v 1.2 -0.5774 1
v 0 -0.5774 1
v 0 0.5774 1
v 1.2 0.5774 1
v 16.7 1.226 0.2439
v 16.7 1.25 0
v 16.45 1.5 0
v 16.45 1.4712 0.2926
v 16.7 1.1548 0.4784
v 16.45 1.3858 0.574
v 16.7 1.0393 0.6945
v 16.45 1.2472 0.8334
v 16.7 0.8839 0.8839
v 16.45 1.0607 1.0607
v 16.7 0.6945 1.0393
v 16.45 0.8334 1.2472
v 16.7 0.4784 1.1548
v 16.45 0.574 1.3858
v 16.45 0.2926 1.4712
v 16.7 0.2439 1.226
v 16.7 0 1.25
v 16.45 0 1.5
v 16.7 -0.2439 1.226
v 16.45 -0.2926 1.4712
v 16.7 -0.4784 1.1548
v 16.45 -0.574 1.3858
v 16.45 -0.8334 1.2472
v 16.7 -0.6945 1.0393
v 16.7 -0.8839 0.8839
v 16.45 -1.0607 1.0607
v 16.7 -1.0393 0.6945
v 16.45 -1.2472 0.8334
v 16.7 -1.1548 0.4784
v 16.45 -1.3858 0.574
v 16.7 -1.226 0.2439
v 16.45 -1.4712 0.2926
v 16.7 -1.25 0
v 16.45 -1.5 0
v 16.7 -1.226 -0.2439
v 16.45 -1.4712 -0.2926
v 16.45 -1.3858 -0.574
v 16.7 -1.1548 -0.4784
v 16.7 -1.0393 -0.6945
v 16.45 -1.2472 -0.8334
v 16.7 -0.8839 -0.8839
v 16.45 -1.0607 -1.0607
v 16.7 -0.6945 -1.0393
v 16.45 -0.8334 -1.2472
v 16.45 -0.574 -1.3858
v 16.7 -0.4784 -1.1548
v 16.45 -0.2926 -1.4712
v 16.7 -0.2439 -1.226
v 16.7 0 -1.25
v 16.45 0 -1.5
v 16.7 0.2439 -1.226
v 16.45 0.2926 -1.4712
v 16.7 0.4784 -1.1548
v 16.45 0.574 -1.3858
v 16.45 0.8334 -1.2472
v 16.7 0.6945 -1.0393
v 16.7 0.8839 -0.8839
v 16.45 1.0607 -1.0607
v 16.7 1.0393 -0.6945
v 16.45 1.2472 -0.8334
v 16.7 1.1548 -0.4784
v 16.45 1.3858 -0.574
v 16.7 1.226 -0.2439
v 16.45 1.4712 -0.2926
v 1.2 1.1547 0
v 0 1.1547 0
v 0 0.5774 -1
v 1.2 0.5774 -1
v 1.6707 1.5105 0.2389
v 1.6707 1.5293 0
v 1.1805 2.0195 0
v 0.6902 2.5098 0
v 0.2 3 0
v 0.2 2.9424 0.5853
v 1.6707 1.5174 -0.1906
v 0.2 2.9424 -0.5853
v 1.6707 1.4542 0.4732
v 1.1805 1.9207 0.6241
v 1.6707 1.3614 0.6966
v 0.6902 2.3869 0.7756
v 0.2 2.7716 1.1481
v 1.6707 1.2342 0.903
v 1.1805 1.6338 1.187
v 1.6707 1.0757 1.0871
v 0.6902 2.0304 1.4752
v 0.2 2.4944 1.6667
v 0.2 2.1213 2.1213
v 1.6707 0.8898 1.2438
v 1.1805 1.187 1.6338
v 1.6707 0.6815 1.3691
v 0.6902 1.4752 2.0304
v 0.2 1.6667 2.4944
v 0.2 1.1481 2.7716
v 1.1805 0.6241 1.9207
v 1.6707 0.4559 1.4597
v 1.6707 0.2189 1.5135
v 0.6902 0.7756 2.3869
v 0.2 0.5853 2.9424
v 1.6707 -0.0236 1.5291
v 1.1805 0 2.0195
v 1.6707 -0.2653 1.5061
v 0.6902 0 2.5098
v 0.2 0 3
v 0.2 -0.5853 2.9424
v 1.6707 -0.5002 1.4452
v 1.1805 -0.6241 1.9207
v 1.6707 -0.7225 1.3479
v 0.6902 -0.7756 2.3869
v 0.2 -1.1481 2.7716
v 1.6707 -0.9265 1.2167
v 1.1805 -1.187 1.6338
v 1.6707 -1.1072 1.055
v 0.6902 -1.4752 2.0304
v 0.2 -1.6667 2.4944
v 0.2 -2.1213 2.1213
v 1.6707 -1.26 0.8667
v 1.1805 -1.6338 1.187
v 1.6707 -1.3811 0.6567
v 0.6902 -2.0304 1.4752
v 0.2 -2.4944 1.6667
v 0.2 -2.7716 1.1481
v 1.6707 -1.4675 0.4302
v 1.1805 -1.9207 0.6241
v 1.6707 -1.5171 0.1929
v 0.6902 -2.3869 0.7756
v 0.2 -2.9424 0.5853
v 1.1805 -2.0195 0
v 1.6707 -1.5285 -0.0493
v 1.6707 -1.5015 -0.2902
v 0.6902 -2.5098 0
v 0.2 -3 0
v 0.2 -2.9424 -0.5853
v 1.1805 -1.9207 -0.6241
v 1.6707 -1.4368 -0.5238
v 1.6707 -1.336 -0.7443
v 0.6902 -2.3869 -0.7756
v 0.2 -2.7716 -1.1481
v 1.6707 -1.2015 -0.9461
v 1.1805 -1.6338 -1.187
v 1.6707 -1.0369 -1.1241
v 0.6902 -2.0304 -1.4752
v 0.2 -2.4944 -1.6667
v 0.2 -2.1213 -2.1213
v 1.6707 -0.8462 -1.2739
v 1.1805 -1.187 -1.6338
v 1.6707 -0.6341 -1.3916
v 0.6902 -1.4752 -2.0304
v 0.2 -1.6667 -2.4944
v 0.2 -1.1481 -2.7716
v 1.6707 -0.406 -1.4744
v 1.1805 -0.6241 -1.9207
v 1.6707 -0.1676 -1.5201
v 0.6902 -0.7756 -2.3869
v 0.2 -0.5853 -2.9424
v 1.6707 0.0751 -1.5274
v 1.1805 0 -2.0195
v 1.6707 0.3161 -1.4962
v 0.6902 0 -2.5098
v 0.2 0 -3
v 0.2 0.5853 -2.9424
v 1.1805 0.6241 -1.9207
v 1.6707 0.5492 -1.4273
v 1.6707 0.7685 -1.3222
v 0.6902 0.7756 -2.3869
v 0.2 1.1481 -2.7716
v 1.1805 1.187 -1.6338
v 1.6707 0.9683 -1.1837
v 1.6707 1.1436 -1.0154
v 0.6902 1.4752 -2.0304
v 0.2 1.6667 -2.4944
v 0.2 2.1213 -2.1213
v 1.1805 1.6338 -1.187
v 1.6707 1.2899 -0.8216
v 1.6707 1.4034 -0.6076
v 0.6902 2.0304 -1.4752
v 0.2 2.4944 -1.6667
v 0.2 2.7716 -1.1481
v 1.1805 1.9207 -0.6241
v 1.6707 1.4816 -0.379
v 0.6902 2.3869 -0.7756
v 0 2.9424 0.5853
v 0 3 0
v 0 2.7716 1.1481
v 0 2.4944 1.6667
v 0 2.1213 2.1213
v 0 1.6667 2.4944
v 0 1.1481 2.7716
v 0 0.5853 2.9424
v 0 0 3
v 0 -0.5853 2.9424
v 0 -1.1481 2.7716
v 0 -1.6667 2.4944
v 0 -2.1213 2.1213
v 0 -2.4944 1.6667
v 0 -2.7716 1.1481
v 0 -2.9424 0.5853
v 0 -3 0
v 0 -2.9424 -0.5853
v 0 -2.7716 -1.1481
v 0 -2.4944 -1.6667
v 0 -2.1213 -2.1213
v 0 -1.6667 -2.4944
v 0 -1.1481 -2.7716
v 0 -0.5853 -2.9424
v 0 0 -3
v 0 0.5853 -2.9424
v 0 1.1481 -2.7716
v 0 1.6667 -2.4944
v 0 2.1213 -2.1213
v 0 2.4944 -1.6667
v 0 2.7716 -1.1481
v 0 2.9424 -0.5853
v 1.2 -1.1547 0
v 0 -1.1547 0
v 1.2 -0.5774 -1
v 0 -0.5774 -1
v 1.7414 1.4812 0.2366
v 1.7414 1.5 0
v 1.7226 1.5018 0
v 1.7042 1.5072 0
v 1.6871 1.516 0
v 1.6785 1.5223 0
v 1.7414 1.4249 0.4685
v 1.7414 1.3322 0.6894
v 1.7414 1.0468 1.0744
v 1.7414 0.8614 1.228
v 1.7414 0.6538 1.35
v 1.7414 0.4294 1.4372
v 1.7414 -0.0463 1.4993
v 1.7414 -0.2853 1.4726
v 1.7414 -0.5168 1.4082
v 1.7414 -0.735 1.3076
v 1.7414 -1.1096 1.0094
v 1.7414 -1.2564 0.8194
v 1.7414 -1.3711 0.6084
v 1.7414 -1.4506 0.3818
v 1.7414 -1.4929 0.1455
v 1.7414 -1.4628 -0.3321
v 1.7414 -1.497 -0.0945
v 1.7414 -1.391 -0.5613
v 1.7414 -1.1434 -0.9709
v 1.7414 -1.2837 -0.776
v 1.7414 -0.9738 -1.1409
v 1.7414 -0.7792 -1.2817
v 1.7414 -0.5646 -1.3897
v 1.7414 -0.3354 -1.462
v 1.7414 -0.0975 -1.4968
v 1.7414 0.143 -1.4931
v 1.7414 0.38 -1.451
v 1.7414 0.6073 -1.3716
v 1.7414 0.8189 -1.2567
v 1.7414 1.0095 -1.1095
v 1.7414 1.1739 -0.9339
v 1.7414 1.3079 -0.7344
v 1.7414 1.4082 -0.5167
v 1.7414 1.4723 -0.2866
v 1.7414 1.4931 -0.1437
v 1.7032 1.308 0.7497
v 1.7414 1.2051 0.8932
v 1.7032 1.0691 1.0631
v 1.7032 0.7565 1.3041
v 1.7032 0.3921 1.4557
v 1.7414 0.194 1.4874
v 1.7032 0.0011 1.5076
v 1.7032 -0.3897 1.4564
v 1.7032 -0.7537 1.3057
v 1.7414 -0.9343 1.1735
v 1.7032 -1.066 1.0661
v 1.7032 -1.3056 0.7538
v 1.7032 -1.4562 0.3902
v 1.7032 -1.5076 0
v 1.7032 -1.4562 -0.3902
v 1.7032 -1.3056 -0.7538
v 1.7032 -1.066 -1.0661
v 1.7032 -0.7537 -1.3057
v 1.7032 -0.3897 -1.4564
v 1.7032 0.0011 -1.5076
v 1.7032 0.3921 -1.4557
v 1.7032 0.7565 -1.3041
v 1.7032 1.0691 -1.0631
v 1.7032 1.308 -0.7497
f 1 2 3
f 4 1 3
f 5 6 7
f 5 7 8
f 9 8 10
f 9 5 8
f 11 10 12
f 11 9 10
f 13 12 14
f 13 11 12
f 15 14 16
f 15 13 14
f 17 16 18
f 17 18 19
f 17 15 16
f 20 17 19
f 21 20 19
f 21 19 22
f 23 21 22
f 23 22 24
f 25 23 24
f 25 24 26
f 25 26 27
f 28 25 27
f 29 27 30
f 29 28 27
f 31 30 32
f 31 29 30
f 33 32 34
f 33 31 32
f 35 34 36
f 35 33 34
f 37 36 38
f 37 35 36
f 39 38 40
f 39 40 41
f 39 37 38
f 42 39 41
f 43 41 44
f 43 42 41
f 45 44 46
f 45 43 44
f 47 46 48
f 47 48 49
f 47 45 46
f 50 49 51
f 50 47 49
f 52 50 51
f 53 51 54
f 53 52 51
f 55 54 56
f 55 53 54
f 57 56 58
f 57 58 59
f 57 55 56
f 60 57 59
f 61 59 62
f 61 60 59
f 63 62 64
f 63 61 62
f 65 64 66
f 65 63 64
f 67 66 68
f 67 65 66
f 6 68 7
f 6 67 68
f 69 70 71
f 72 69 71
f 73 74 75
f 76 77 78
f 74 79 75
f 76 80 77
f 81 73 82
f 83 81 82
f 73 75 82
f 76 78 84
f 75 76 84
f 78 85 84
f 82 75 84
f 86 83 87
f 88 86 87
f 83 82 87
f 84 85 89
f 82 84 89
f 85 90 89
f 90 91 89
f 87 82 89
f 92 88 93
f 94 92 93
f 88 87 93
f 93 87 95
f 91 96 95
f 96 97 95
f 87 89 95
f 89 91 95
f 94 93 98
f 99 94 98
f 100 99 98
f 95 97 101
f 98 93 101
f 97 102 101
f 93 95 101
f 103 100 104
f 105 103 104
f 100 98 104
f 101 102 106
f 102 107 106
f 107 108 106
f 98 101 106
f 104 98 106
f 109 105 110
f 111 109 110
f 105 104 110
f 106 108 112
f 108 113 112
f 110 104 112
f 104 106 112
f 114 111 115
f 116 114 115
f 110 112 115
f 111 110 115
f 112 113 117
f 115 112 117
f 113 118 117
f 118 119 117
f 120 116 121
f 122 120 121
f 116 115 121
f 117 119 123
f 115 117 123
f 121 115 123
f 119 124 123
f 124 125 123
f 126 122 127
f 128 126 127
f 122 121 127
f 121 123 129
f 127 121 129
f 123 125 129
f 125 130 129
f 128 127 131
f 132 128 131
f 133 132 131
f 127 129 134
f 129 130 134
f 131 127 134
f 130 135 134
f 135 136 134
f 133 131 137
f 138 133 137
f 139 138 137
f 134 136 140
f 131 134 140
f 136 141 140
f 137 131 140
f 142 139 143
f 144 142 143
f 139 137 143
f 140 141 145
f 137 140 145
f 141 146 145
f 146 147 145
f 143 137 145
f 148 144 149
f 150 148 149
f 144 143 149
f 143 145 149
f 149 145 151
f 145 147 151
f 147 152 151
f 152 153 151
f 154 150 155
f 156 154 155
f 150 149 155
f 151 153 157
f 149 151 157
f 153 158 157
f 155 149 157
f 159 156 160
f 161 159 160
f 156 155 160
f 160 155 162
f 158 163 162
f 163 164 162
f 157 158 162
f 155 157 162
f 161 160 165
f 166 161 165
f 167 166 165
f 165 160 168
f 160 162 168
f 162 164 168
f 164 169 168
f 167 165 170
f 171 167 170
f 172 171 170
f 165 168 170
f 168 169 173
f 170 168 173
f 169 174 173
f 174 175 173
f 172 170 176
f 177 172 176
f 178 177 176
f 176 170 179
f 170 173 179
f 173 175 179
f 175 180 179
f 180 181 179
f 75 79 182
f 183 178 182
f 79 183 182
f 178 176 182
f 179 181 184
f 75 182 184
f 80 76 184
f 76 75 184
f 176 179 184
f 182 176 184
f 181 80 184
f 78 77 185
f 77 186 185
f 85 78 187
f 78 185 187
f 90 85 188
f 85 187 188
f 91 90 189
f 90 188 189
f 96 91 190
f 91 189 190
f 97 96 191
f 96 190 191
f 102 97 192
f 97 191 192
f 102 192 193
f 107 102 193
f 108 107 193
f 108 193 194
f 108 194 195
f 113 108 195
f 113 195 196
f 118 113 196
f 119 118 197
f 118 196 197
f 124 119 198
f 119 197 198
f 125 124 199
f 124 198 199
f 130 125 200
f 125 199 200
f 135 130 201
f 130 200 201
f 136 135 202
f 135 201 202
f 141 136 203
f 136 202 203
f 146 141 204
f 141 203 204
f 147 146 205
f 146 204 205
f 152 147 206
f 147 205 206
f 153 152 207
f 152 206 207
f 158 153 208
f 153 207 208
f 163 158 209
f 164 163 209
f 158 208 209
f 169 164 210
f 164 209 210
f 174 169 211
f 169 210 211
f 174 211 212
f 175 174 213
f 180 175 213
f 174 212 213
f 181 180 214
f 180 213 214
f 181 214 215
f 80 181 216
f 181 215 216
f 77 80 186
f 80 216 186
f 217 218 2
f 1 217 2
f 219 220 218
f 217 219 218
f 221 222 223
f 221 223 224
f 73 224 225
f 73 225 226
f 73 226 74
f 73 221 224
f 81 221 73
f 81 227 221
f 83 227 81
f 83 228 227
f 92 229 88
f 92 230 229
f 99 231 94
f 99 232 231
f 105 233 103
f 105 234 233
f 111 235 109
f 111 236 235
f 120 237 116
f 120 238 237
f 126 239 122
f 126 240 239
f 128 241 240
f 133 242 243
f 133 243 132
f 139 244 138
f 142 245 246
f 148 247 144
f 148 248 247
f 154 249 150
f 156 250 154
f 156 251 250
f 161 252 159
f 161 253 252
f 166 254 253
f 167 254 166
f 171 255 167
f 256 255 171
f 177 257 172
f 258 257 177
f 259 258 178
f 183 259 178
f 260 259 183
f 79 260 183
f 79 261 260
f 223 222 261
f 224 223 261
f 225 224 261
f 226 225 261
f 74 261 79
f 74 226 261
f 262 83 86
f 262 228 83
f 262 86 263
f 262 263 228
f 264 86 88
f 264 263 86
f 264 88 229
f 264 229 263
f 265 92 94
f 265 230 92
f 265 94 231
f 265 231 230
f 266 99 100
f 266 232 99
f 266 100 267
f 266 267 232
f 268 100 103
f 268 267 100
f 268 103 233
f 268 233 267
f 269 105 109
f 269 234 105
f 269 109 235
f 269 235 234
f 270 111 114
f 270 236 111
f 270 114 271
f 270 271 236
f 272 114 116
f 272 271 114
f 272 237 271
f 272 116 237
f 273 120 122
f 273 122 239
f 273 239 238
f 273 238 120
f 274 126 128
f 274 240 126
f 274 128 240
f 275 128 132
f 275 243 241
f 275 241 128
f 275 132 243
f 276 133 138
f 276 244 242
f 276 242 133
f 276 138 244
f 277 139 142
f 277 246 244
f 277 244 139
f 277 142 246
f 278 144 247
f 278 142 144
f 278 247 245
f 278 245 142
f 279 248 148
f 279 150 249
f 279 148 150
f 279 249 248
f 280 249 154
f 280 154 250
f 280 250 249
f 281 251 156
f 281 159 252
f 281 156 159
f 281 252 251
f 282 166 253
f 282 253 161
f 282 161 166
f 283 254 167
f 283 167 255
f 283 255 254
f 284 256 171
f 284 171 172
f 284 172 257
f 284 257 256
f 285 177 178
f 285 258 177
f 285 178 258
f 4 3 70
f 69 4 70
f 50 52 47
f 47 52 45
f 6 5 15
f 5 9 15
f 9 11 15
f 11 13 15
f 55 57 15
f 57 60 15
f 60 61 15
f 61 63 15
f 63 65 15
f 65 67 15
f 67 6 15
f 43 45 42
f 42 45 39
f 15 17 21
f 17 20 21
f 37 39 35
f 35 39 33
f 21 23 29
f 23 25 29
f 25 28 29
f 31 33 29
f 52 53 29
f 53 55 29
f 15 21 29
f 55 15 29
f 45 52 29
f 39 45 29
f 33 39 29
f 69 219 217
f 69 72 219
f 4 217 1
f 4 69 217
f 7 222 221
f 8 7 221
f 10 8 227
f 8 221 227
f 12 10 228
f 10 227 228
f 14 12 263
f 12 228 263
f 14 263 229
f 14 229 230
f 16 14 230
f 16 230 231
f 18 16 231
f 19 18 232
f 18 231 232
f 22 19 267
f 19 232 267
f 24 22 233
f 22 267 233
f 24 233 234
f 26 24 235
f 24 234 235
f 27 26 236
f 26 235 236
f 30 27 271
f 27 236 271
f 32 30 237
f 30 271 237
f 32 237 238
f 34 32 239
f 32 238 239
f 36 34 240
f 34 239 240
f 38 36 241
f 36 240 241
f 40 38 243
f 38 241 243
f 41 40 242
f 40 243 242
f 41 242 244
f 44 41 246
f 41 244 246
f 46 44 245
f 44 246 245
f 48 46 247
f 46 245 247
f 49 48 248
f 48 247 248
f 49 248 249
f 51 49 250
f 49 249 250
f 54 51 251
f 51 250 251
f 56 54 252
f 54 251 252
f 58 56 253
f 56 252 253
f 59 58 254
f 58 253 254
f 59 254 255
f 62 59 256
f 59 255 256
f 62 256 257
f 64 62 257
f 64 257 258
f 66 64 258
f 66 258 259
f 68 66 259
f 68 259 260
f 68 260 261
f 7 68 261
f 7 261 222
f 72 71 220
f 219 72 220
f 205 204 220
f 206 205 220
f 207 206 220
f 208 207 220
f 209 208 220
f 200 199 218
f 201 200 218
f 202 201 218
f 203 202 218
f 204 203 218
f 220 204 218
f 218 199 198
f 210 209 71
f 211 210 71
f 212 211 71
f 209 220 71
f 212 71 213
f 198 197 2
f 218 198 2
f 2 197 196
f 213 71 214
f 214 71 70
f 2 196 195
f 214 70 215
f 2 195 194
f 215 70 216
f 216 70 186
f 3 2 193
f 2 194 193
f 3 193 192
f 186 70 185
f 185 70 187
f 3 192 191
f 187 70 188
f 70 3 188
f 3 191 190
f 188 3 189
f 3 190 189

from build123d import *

# Parameters (mm, degrees)
CUT_EXTRUDE_1_DEPTH = 1.2
CHAMFER_1_SIZE      = 0.25
FILLET_1_R          = 0.1


with BuildPart() as part:
    # 草圖1 → 旋轉1 (revolve)
    with BuildSketch(Plane.XY):
        Polygon((0, 3), (0, 0), (16.7, 0), (16.7, 1.5), (1.7, 1.5), (0.2, 3), align=None)
    revolve(axis=Axis((0, 0, 0), (1, 0, 0)))

    # 草圖2 → 除料-伸長1 (cut)
    with BuildSketch(Plane.ZY):
        Polygon((-1, -0.577350269), (0, -1.154700538), (1, -0.577350269), (1, 0.577350269), (0, 1.154700538), (-1, 0.577350269), align=None)
    extrude(amount=-CUT_EXTRUDE_1_DEPTH, mode=Mode.SUBTRACT)

    # 導角1
    chamfer_1_edges = [part.edges().sort_by_distance(p)[0] for p in [
        (16.7, -1.5, 0),
    ]]
    chamfer(chamfer_1_edges, length=CHAMFER_1_SIZE)

    # 圓角1
    fillet_1_edges = [part.edges().sort_by_distance(p)[0] for p in [
        (1.7, -1.5, 0),
    ]]
    fillet(fillet_1_edges, radius=FILLET_1_R)


solid = part.part
